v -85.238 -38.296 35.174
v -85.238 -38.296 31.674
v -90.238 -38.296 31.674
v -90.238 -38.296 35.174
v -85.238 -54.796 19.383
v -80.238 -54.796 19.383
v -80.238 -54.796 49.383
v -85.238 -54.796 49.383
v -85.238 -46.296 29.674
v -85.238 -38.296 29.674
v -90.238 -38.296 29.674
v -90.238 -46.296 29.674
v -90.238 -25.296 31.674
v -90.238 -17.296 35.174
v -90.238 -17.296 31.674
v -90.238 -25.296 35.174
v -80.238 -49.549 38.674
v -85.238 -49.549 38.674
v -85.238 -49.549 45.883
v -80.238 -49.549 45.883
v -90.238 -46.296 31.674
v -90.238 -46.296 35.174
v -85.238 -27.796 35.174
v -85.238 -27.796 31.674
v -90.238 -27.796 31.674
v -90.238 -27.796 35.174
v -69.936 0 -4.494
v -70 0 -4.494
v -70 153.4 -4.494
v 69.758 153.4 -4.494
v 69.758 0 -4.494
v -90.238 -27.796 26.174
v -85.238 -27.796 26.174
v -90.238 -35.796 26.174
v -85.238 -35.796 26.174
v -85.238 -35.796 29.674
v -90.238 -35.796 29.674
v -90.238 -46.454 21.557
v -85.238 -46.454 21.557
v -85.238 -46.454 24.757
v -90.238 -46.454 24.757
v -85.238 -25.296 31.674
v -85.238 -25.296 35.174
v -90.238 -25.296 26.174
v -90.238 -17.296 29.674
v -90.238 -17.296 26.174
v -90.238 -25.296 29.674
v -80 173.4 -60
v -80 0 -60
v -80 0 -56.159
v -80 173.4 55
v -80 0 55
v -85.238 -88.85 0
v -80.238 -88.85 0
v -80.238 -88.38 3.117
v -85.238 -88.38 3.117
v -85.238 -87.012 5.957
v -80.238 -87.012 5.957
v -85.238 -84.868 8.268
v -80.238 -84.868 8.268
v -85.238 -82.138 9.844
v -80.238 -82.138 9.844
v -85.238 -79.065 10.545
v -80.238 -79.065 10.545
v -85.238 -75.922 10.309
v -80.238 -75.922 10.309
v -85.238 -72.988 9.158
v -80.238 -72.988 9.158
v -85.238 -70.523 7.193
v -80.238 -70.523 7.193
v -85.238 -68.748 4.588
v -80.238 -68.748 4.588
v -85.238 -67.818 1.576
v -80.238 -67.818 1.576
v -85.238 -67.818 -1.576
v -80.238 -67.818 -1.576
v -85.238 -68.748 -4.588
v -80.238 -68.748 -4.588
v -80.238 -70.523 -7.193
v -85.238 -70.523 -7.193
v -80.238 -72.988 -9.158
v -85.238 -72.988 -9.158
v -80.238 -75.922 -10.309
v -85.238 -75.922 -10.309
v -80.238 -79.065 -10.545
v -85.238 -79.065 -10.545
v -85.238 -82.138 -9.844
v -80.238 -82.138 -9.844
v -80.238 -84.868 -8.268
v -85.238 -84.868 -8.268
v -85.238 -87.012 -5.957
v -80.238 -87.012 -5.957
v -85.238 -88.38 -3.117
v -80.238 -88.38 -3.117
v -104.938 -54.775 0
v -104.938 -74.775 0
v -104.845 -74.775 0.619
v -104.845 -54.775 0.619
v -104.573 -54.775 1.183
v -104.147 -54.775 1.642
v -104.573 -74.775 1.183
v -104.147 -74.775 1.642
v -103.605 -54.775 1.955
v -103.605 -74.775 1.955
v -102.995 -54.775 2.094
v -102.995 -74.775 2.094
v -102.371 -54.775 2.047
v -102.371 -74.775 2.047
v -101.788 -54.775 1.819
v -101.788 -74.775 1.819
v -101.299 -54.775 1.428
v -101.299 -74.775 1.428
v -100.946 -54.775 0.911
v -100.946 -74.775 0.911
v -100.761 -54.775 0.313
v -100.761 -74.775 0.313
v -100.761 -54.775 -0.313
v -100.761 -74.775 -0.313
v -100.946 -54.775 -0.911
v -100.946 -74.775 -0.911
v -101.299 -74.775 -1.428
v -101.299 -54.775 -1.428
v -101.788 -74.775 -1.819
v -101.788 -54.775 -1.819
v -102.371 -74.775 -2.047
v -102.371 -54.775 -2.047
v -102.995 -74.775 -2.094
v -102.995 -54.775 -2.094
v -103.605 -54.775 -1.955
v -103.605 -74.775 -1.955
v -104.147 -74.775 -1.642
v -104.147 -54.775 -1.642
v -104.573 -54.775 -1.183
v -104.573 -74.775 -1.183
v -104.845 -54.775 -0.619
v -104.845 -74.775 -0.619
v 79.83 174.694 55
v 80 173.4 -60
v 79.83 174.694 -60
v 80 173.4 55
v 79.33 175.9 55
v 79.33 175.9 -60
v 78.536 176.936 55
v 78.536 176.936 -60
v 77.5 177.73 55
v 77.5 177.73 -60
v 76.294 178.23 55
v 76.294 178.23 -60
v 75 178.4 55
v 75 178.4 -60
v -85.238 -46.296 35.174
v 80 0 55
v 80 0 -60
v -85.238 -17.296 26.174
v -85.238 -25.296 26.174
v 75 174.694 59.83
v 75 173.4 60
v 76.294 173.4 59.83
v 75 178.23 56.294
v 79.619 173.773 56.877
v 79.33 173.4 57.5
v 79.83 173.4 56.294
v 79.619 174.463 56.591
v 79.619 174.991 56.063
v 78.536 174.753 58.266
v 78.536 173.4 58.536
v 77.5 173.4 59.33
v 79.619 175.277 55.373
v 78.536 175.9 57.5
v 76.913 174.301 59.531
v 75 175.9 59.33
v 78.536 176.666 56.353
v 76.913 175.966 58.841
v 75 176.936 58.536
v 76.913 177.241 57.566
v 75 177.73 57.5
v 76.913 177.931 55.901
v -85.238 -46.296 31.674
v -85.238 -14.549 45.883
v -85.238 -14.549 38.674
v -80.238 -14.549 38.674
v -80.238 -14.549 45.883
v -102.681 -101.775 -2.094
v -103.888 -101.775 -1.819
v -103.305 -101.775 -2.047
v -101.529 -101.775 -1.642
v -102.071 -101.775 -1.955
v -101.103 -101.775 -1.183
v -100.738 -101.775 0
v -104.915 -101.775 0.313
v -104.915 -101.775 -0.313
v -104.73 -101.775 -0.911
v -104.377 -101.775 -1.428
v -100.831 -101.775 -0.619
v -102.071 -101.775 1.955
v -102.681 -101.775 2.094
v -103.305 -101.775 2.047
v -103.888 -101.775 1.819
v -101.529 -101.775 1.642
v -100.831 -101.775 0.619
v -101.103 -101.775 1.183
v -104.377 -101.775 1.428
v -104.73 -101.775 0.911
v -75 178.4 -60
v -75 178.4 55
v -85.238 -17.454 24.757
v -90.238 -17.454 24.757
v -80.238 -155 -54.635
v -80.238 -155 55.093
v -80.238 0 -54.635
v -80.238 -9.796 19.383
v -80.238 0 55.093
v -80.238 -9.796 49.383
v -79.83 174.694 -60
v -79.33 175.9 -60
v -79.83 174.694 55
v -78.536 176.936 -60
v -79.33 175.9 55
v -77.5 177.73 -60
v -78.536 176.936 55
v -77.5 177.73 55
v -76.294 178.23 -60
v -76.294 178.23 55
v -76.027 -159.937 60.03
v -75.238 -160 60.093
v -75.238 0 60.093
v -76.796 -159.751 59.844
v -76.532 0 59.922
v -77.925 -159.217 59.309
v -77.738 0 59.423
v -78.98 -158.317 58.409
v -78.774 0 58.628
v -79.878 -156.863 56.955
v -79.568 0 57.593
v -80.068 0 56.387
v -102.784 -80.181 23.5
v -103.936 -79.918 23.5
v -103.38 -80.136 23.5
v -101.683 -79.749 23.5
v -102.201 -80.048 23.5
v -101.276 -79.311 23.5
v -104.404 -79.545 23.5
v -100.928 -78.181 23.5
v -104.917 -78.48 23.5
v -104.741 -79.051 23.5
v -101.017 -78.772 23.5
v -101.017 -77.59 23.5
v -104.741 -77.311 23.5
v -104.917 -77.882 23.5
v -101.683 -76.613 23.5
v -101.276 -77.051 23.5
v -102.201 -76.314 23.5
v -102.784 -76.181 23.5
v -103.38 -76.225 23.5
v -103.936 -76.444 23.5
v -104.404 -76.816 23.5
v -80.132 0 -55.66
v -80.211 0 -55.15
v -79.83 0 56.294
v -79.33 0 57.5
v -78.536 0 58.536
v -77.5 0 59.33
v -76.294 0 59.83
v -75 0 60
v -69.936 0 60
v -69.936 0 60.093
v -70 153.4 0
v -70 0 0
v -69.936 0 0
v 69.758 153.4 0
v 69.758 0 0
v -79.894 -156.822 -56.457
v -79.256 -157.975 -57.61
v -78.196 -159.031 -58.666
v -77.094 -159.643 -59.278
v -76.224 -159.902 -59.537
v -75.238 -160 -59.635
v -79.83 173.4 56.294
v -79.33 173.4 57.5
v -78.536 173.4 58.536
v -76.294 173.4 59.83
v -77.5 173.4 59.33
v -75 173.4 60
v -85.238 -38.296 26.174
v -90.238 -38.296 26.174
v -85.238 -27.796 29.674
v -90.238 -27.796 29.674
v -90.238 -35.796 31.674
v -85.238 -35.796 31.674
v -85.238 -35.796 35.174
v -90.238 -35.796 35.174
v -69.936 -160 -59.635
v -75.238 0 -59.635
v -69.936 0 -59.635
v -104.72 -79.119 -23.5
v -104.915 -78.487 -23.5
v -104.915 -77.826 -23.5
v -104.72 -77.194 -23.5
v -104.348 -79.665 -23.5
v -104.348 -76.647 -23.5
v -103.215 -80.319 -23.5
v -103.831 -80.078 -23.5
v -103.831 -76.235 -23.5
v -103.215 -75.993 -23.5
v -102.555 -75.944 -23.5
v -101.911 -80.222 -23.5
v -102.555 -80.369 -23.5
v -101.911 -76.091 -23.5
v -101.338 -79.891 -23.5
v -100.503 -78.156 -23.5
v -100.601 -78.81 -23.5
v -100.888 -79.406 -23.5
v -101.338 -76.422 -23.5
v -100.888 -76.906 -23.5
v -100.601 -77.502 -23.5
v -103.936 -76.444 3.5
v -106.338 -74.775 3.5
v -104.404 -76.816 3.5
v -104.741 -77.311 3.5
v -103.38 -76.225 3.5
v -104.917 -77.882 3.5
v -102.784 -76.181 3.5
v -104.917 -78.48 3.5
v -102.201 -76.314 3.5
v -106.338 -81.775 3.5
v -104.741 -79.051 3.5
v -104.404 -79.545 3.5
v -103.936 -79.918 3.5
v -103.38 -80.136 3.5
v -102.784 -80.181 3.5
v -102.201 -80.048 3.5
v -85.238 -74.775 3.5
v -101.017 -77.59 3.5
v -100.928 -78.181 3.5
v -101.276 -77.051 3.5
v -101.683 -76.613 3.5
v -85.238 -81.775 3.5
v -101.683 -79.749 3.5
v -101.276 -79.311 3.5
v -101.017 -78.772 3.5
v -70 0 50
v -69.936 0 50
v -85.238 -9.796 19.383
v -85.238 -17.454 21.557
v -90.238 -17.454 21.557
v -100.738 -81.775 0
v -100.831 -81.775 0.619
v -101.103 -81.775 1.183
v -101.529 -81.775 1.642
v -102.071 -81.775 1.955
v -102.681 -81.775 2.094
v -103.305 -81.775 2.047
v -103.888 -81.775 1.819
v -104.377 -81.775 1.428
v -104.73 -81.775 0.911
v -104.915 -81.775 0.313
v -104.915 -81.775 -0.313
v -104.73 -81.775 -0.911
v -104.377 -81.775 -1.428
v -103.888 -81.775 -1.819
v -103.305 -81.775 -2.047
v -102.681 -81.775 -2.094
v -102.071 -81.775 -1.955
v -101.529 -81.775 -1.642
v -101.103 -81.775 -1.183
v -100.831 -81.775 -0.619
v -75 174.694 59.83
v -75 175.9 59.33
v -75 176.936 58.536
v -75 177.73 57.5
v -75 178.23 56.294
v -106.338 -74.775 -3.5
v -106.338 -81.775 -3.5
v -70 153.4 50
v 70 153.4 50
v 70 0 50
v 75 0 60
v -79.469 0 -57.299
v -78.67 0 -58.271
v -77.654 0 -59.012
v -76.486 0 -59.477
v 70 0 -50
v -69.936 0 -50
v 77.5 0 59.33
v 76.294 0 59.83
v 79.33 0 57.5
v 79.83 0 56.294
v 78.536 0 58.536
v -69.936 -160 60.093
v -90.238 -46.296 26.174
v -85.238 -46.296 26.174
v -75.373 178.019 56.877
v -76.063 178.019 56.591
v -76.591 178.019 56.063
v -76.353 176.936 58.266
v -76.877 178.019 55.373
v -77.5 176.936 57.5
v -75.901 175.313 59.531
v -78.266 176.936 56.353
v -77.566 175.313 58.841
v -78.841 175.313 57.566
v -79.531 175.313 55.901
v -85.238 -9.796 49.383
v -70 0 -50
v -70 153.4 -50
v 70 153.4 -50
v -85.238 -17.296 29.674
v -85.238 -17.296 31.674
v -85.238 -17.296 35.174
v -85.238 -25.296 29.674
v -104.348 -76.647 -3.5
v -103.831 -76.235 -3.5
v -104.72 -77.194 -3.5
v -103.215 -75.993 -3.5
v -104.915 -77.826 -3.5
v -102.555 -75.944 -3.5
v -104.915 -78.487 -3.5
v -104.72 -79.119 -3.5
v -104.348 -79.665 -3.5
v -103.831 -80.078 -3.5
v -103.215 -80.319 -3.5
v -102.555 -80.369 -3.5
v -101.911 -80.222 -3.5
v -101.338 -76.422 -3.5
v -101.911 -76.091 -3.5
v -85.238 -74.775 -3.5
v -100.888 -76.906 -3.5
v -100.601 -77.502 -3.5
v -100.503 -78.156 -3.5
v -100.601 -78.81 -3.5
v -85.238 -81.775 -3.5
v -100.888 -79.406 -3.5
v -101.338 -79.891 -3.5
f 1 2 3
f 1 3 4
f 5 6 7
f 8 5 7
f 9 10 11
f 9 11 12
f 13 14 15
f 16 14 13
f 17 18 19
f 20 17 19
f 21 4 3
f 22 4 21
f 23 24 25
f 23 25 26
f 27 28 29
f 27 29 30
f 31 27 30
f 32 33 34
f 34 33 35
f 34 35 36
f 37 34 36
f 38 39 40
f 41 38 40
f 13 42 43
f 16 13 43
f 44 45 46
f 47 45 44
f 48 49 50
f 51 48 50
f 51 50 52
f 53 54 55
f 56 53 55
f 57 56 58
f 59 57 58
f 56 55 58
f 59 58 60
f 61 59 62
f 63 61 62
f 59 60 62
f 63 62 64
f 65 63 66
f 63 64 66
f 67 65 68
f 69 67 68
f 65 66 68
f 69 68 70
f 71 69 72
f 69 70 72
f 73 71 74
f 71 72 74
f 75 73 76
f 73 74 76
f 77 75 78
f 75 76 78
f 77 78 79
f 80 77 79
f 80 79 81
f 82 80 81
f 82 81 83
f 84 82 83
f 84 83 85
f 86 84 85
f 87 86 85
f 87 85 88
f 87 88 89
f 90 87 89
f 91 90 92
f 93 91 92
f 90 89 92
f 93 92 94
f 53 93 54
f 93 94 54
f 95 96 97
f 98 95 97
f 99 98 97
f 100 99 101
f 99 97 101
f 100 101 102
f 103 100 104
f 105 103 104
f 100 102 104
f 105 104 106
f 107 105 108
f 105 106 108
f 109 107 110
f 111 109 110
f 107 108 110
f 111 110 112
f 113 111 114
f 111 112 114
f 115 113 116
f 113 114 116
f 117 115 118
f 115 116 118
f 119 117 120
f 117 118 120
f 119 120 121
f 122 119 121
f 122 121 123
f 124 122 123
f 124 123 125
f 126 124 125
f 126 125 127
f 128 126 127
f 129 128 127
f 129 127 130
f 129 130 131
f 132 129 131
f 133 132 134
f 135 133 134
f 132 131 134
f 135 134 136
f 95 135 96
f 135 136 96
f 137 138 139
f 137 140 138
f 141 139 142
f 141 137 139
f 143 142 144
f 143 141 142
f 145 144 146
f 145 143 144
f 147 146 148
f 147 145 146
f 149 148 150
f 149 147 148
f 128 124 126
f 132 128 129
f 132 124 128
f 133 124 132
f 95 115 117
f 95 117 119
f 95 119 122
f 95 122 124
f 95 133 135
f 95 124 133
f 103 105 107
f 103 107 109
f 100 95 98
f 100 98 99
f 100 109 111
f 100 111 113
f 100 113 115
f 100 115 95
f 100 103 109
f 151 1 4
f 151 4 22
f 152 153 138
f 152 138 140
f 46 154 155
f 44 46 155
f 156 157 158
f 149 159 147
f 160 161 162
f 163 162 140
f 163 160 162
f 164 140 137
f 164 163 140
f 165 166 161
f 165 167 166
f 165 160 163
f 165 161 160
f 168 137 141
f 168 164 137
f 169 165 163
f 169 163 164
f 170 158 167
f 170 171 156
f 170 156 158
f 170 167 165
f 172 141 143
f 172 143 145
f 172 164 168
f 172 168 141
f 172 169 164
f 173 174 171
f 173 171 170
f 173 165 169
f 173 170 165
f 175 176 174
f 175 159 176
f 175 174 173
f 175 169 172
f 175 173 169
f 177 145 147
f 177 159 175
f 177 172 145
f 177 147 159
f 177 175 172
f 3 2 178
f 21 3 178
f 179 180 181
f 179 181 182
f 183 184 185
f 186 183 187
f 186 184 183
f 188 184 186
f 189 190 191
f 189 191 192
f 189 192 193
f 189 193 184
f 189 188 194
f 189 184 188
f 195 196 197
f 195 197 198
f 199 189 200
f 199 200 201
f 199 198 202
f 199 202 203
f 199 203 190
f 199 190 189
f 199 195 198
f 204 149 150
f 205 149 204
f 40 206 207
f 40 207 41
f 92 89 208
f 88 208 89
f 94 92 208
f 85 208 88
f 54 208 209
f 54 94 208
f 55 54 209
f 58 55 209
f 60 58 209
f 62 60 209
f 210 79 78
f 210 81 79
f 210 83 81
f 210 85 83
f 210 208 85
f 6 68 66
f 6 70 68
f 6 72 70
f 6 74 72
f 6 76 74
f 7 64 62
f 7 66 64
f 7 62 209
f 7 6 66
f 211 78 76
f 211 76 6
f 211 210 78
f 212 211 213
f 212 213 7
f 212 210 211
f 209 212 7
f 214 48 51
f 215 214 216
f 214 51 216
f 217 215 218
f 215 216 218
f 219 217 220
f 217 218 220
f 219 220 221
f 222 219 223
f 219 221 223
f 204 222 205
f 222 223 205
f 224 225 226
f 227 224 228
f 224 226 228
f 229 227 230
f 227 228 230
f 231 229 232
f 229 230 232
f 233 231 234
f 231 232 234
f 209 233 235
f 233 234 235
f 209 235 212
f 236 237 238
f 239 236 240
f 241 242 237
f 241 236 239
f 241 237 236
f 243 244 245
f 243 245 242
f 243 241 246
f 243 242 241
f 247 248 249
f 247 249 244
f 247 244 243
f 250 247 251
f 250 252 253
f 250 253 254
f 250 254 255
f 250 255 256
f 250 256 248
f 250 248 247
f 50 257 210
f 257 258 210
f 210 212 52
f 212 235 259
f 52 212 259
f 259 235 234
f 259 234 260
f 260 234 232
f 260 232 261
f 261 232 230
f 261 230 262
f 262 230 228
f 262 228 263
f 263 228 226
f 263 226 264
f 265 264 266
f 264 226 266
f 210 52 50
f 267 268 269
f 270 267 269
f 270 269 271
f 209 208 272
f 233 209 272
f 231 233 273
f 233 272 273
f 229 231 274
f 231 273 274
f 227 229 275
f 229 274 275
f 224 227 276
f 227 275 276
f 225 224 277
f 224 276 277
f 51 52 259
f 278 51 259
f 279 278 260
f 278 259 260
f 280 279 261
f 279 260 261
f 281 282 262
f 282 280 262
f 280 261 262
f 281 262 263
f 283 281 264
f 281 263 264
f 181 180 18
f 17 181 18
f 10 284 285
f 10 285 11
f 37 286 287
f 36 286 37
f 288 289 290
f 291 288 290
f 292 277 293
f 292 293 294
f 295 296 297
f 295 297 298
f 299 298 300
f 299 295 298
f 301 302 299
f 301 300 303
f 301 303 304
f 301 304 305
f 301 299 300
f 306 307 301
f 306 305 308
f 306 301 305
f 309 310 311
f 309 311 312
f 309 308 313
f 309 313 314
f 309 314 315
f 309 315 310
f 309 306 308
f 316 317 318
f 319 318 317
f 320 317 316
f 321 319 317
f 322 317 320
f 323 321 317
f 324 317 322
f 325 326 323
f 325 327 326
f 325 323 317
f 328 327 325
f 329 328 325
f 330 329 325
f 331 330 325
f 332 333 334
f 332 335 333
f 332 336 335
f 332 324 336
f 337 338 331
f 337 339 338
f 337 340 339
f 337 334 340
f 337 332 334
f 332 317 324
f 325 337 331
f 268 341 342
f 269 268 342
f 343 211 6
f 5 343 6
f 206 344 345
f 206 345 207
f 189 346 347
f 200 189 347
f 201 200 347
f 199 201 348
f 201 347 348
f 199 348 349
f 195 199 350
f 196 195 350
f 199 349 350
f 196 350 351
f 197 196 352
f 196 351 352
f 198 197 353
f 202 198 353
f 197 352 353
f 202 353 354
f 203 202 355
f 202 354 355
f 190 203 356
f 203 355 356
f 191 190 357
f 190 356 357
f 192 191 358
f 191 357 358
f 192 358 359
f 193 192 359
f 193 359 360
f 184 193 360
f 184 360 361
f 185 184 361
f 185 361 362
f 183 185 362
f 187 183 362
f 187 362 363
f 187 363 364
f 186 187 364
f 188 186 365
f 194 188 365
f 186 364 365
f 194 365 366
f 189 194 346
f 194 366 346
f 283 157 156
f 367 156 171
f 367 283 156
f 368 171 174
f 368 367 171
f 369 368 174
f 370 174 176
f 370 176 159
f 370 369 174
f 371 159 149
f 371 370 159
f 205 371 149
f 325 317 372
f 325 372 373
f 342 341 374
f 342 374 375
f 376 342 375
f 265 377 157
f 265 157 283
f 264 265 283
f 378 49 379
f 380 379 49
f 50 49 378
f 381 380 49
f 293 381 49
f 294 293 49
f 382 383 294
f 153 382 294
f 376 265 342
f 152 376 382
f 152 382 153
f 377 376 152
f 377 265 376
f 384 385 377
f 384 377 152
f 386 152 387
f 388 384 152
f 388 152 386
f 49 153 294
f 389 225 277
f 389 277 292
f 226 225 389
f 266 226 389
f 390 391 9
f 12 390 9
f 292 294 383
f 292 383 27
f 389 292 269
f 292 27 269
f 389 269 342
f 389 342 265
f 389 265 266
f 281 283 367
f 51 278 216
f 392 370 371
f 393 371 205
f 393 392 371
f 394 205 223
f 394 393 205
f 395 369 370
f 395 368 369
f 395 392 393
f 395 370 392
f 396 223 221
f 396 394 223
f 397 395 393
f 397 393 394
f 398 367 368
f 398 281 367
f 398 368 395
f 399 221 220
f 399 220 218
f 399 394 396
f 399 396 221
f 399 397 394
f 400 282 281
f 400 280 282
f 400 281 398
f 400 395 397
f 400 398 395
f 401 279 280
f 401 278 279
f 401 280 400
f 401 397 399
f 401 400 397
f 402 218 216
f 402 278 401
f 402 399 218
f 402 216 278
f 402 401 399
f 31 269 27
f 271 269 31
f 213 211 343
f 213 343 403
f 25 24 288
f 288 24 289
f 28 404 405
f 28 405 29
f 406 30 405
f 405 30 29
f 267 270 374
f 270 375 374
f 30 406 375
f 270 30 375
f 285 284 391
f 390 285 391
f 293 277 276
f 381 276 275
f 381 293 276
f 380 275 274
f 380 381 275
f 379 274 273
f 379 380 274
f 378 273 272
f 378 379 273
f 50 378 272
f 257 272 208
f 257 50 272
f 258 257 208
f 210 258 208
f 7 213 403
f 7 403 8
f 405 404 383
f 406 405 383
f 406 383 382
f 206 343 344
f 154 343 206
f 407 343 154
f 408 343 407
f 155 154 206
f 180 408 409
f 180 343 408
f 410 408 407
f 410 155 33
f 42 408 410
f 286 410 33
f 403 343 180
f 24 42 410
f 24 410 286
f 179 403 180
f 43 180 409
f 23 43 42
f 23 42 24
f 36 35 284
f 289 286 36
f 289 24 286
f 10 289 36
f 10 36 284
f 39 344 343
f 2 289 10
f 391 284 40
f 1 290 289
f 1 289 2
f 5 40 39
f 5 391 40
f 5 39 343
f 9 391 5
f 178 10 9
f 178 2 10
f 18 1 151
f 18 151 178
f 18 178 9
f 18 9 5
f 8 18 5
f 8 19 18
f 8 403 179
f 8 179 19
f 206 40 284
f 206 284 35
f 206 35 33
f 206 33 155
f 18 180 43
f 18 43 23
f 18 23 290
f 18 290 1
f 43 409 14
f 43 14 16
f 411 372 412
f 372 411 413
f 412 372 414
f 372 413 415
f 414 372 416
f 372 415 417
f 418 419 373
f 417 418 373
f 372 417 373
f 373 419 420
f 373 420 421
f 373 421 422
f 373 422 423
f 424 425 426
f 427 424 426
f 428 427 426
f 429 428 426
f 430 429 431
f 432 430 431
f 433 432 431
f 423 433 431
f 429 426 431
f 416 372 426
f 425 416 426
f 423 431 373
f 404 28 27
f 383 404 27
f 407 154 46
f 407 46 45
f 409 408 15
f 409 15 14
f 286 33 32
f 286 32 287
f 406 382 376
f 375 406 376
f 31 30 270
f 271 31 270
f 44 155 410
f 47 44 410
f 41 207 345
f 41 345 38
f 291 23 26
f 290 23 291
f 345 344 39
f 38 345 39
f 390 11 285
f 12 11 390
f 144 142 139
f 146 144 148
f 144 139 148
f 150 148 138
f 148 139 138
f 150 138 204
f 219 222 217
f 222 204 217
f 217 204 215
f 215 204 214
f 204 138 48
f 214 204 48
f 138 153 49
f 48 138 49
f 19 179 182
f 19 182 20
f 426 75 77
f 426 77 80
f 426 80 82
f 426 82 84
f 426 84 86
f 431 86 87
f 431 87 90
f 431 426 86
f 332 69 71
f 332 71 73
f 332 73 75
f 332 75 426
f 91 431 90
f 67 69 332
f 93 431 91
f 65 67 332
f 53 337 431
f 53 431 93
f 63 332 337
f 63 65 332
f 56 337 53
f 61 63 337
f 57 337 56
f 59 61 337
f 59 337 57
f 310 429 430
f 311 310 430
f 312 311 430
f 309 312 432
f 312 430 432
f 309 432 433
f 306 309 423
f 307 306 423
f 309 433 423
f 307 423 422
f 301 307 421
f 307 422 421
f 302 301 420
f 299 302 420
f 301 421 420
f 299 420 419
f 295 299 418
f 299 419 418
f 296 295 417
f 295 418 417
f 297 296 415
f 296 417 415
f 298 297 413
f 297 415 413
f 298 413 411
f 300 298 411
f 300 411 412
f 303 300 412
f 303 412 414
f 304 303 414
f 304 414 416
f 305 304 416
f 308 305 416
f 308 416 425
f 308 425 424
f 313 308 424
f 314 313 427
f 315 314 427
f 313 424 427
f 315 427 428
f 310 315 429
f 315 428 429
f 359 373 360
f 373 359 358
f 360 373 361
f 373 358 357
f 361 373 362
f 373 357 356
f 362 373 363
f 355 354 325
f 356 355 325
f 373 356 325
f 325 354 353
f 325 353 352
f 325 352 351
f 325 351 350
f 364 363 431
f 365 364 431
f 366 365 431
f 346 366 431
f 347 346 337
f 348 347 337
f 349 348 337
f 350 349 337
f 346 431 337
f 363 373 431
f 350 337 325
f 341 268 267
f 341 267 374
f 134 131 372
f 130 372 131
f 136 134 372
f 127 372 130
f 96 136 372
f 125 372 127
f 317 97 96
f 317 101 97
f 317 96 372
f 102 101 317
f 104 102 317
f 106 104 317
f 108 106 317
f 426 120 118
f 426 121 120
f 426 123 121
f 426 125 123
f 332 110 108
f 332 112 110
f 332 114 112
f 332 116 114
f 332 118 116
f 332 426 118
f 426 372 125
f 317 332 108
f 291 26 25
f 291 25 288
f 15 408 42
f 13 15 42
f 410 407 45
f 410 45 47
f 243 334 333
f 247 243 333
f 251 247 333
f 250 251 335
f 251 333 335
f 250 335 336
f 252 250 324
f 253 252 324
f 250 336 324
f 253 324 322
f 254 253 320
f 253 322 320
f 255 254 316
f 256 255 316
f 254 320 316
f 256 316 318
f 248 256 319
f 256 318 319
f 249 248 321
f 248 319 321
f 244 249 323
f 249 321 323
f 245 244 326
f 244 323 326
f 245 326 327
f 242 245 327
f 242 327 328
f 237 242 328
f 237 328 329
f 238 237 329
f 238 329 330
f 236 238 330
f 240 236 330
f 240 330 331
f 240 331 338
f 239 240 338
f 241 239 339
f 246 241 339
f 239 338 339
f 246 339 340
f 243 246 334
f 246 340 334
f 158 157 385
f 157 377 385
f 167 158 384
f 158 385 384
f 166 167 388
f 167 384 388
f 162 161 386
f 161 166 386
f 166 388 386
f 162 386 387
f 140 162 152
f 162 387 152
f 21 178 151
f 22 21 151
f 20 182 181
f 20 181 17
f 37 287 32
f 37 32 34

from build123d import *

# Parameters (mm, degrees)
F0_W         = 160
F0_H         = 120
F0_W_2       = 140
F0_H_2       = 100
F1_DEPTH     = 153.4
F2_W         = 160
F2_H         = 120
F3_DEPTH     = 25
F5_W         = 3
F5_H         = 25
F5_W_2       = 2.5065724061
F5_H_2       = 21.7677888939
F7_W         = 10.3015974164
F7_H         = 119.727473706
F8_DEPTH     = 160
F9_R         = 10.5745800983
F10_DEPTH    = 5
F11_W        = 7
F11_H        = 7
F12_DEPTH    = 21.1
F13_R        = 2.005862126
F14_DEPTH    = 20
F15_R        = 2.1
F16_DEPTH    = 20
F17_R        = 2.1
F18_DEPTH    = 20
F19_R        = 2.218699255
F20_DEPTH    = 20
F21_W        = 45
F21_H        = 30
F22_DEPTH    = 5
F23_W        = 35
F23_H        = 7.2088057839
F24_DEPTH    = 5
F25_W        = 8
F25_H        = 3.5
F26_DEPTH    = 5
F27_W        = 140
F27_H        = 4.4944308201
F28_DEPTH    = 176
F29_W        = 29
F29_H        = 3.2
F30_DEPTH    = 5
F31_R        = 5
F32_T1_DEPTH = 185
F32_T3_DEPTH = 144.727473706
F32_T5_DEPTH = 172.5


# Not quite as in the source:
# - a fillet or chamfer that OpenCascade refuses, or shapes differently, is made with other operations: its cross-section is extruded or revolved along the edge and cut away or added


with BuildPart() as f1:
    # F0 (on Front) → F1 (new body)
    with BuildSketch(Plane.XZ):
        Rectangle(F0_W, F0_H)
        Rectangle(F0_W_2, F0_H_2, mode=Mode.SUBTRACT)
    extrude(amount=-F1_DEPTH)

    # F2 (on face) → F3 (join)
    with BuildSketch(Plane(origin=(0, 153.4, 0), x_dir=(-1, 0, 0), z_dir=(0, 1, 0))):
        Rectangle(F2_W, F2_H)
    extrude(amount=F3_DEPTH)

    # F5 (on face) → F6 (revolve)
    with BuildSketch(Plane.XZ):
        with Locations((-75.5, 22.5)):
            Rectangle(F5_W, F5_H)
        with Locations((-75.746713797, -24.116105553)):
            Rectangle(F5_W_2, F5_H_2)
    revolve(axis=Axis((-74, 0, 22.5), (0, 0, -1)))

    # F7 (on face) → F8 (join)
    with BuildSketch(Plane.XZ):
        with Locations((-75.0872157514, 0.2289246768)):
            Rectangle(F7_W, F7_H)
    extrude(amount=F8_DEPTH)

    # F9 (on face) → F10 (join)
    with BuildSketch(Plane(origin=(-80.2380144596, 0, 0), x_dir=(0, -1, 0), z_dir=(-1, 0, 0))):
        with Locations((78.2749652863, 0)):
            Circle(F9_R)
    extrude(amount=F10_DEPTH)

    # F11 (on face) → F12 (join)
    with BuildSketch(Plane(origin=(-85.2380144596, 0, 0), x_dir=(0, -1, 0), z_dir=(-1, 0, 0))):
        with Locations((78.2749652863, 0)):
            Rectangle(F11_W, F11_H)
    extrude(amount=F12_DEPTH)

    # F13 (on face) → F14 (join)
    with BuildSketch(Plane.XY.offset(3.5)):
        with Locations((-102.9334535655, -78.1808274122)):
            Circle(F13_R)
    extrude(amount=F14_DEPTH)

    # F15 (on face) → F16 (join)
    with BuildSketch(Plane(origin=(0, -74.7749652863, 0), x_dir=(-1, 0, 0), z_dir=(0, 1, 0))):
        with Locations((102.8380144596, 0)):
            Circle(F15_R)
    extrude(amount=F16_DEPTH)

    # F17 (on face) → F18 (join)
    with BuildSketch(Plane.XZ.offset(81.7749652863)):
        with Locations((-102.8380144596, 0)):
            Circle(F17_R)
    extrude(amount=F18_DEPTH)

    # F19 (on face) → F20 (join)
    with BuildSketch(Plane(origin=(0, 0, -3.5), x_dir=(1, 0, 0), z_dir=(0, 0, -1))):
        with Locations((-102.7212624934, 78.1562660312)):
            Circle(F19_R)
    extrude(amount=F20_DEPTH)

    # F21 (on face) → F22 (join)
    with BuildSketch(Plane(origin=(-80.2380144596, 0, 0), x_dir=(0, -1, 0), z_dir=(-1, 0, 0))):
        with Locations((32.2962999344, 34.3826470941)):
            Rectangle(F21_W, F21_H)
    extrude(amount=F22_DEPTH)

    # F23 (on face) → F24 (cut)
    with BuildSketch(Plane(origin=(-85.2380144596, 0, 0), x_dir=(0, -1, 0), z_dir=(-1, 0, 0))):
        with Locations((32.0492885076, 42.2782442022)):
            Rectangle(F23_W, F23_H)
    extrude(amount=-F24_DEPTH, mode=Mode.SUBTRACT)

    # F25 (on face) → F26 (join)
    with BuildSketch(Plane(origin=(-85.2380144596, 0, 0), x_dir=(0, -1, 0), z_dir=(-1, 0, 0))):
        with Locations((21.2962999344, 33.4238413102)):
            Rectangle(F25_W, F25_H)
        with Locations((31.7962999344, 33.4238413102)):
            Rectangle(F25_W, F25_H)
        with Locations((42.2962999344, 33.4238413102)):
            Rectangle(F25_W, F25_H)
        with Locations((21.2962999344, 27.9238413102)):
            Rectangle(F25_W, F25_H)
        with Locations((31.7962999344, 27.9238413102)):
            Rectangle(F25_W, F25_H)
        with Locations((42.2962999344, 27.9238413102)):
            Rectangle(F25_W, F25_H)
    extrude(amount=F26_DEPTH)

    # F27 (on face) → F28 (join)
    with BuildSketch(Plane.XZ):
        with Locations((-0.2423568684, -2.24721541)):
            Rectangle(F27_W, F27_H)
    extrude(amount=-F28_DEPTH)

    # F29 (on face) → F30 (join)
    with BuildSketch(Plane(origin=(-85.2380144596, 0, 0), x_dir=(0, -1, 0), z_dir=(-1, 0, 0))):
        with Locations((31.9544213465, 23.1566587463)):
            Rectangle(F29_W, F29_H)
    extrude(amount=F30_DEPTH)

    # F31
    f31_edges = [f1.edges().sort_by_distance(p)[0] for p in [
        (-80, 89.2, 60),
        (0, 178.4, 60),
        (80, 89.2, 60),
        (80, 178.4, 0),
        (-80, 178.4, 0),
    ]]
    fillet(f31_edges, radius=F31_R)

    # F32: fillet of radius 5 on 3 edges, made by hand

    # F32_s2 → F32_t1 (cut)
    with BuildSketch(Plane.XZ.offset(-12.5)):
        with BuildLine():
            ThreePointArc((-75.2380144596, 60.0926615298), (-78.7735483655, 58.6281954357), (-80.2380144596, 55.0926615298))
            Line((-80.2380144596, 55.0926615298), (-80.2380144596, 60.0926615298))
            Line((-80.2380144596, 60.0926615298), (-75.2380144596, 60.0926615298))
        make_face()
    extrude(amount=F32_T1_DEPTH, mode=Mode.SUBTRACT)

    # F32_s4 → F32_t3 (cut)
    with BuildSketch(Plane.XY.offset(-72.1348121762)):
        with BuildLine():
            ThreePointArc((-80.2380144596, -155), (-78.7735483655, -158.5355339059), (-75.2380144596, -160))
            Line((-75.2380144596, -160), (-80.2380144596, -160))
            Line((-80.2380144596, -160), (-80.2380144596, -155))
        make_face()
    extrude(amount=F32_T3_DEPTH, mode=Mode.SUBTRACT)

    # F32_s6 → F32_t5 (cut)
    with BuildSketch(Plane.XZ):
        with BuildLine():
            ThreePointArc((-75.2380144596, -59.6348121762), (-78.7735483655, -58.1703460822), (-80.2380144596, -54.6348121762))
            Line((-80.2380144596, -54.6348121762), (-80.2380144596, -59.6348121762))
            Line((-80.2380144596, -59.6348121762), (-75.2380144596, -59.6348121762))
        make_face()
    extrude(amount=F32_T5_DEPTH, mode=Mode.SUBTRACT)


solid = f1.part
